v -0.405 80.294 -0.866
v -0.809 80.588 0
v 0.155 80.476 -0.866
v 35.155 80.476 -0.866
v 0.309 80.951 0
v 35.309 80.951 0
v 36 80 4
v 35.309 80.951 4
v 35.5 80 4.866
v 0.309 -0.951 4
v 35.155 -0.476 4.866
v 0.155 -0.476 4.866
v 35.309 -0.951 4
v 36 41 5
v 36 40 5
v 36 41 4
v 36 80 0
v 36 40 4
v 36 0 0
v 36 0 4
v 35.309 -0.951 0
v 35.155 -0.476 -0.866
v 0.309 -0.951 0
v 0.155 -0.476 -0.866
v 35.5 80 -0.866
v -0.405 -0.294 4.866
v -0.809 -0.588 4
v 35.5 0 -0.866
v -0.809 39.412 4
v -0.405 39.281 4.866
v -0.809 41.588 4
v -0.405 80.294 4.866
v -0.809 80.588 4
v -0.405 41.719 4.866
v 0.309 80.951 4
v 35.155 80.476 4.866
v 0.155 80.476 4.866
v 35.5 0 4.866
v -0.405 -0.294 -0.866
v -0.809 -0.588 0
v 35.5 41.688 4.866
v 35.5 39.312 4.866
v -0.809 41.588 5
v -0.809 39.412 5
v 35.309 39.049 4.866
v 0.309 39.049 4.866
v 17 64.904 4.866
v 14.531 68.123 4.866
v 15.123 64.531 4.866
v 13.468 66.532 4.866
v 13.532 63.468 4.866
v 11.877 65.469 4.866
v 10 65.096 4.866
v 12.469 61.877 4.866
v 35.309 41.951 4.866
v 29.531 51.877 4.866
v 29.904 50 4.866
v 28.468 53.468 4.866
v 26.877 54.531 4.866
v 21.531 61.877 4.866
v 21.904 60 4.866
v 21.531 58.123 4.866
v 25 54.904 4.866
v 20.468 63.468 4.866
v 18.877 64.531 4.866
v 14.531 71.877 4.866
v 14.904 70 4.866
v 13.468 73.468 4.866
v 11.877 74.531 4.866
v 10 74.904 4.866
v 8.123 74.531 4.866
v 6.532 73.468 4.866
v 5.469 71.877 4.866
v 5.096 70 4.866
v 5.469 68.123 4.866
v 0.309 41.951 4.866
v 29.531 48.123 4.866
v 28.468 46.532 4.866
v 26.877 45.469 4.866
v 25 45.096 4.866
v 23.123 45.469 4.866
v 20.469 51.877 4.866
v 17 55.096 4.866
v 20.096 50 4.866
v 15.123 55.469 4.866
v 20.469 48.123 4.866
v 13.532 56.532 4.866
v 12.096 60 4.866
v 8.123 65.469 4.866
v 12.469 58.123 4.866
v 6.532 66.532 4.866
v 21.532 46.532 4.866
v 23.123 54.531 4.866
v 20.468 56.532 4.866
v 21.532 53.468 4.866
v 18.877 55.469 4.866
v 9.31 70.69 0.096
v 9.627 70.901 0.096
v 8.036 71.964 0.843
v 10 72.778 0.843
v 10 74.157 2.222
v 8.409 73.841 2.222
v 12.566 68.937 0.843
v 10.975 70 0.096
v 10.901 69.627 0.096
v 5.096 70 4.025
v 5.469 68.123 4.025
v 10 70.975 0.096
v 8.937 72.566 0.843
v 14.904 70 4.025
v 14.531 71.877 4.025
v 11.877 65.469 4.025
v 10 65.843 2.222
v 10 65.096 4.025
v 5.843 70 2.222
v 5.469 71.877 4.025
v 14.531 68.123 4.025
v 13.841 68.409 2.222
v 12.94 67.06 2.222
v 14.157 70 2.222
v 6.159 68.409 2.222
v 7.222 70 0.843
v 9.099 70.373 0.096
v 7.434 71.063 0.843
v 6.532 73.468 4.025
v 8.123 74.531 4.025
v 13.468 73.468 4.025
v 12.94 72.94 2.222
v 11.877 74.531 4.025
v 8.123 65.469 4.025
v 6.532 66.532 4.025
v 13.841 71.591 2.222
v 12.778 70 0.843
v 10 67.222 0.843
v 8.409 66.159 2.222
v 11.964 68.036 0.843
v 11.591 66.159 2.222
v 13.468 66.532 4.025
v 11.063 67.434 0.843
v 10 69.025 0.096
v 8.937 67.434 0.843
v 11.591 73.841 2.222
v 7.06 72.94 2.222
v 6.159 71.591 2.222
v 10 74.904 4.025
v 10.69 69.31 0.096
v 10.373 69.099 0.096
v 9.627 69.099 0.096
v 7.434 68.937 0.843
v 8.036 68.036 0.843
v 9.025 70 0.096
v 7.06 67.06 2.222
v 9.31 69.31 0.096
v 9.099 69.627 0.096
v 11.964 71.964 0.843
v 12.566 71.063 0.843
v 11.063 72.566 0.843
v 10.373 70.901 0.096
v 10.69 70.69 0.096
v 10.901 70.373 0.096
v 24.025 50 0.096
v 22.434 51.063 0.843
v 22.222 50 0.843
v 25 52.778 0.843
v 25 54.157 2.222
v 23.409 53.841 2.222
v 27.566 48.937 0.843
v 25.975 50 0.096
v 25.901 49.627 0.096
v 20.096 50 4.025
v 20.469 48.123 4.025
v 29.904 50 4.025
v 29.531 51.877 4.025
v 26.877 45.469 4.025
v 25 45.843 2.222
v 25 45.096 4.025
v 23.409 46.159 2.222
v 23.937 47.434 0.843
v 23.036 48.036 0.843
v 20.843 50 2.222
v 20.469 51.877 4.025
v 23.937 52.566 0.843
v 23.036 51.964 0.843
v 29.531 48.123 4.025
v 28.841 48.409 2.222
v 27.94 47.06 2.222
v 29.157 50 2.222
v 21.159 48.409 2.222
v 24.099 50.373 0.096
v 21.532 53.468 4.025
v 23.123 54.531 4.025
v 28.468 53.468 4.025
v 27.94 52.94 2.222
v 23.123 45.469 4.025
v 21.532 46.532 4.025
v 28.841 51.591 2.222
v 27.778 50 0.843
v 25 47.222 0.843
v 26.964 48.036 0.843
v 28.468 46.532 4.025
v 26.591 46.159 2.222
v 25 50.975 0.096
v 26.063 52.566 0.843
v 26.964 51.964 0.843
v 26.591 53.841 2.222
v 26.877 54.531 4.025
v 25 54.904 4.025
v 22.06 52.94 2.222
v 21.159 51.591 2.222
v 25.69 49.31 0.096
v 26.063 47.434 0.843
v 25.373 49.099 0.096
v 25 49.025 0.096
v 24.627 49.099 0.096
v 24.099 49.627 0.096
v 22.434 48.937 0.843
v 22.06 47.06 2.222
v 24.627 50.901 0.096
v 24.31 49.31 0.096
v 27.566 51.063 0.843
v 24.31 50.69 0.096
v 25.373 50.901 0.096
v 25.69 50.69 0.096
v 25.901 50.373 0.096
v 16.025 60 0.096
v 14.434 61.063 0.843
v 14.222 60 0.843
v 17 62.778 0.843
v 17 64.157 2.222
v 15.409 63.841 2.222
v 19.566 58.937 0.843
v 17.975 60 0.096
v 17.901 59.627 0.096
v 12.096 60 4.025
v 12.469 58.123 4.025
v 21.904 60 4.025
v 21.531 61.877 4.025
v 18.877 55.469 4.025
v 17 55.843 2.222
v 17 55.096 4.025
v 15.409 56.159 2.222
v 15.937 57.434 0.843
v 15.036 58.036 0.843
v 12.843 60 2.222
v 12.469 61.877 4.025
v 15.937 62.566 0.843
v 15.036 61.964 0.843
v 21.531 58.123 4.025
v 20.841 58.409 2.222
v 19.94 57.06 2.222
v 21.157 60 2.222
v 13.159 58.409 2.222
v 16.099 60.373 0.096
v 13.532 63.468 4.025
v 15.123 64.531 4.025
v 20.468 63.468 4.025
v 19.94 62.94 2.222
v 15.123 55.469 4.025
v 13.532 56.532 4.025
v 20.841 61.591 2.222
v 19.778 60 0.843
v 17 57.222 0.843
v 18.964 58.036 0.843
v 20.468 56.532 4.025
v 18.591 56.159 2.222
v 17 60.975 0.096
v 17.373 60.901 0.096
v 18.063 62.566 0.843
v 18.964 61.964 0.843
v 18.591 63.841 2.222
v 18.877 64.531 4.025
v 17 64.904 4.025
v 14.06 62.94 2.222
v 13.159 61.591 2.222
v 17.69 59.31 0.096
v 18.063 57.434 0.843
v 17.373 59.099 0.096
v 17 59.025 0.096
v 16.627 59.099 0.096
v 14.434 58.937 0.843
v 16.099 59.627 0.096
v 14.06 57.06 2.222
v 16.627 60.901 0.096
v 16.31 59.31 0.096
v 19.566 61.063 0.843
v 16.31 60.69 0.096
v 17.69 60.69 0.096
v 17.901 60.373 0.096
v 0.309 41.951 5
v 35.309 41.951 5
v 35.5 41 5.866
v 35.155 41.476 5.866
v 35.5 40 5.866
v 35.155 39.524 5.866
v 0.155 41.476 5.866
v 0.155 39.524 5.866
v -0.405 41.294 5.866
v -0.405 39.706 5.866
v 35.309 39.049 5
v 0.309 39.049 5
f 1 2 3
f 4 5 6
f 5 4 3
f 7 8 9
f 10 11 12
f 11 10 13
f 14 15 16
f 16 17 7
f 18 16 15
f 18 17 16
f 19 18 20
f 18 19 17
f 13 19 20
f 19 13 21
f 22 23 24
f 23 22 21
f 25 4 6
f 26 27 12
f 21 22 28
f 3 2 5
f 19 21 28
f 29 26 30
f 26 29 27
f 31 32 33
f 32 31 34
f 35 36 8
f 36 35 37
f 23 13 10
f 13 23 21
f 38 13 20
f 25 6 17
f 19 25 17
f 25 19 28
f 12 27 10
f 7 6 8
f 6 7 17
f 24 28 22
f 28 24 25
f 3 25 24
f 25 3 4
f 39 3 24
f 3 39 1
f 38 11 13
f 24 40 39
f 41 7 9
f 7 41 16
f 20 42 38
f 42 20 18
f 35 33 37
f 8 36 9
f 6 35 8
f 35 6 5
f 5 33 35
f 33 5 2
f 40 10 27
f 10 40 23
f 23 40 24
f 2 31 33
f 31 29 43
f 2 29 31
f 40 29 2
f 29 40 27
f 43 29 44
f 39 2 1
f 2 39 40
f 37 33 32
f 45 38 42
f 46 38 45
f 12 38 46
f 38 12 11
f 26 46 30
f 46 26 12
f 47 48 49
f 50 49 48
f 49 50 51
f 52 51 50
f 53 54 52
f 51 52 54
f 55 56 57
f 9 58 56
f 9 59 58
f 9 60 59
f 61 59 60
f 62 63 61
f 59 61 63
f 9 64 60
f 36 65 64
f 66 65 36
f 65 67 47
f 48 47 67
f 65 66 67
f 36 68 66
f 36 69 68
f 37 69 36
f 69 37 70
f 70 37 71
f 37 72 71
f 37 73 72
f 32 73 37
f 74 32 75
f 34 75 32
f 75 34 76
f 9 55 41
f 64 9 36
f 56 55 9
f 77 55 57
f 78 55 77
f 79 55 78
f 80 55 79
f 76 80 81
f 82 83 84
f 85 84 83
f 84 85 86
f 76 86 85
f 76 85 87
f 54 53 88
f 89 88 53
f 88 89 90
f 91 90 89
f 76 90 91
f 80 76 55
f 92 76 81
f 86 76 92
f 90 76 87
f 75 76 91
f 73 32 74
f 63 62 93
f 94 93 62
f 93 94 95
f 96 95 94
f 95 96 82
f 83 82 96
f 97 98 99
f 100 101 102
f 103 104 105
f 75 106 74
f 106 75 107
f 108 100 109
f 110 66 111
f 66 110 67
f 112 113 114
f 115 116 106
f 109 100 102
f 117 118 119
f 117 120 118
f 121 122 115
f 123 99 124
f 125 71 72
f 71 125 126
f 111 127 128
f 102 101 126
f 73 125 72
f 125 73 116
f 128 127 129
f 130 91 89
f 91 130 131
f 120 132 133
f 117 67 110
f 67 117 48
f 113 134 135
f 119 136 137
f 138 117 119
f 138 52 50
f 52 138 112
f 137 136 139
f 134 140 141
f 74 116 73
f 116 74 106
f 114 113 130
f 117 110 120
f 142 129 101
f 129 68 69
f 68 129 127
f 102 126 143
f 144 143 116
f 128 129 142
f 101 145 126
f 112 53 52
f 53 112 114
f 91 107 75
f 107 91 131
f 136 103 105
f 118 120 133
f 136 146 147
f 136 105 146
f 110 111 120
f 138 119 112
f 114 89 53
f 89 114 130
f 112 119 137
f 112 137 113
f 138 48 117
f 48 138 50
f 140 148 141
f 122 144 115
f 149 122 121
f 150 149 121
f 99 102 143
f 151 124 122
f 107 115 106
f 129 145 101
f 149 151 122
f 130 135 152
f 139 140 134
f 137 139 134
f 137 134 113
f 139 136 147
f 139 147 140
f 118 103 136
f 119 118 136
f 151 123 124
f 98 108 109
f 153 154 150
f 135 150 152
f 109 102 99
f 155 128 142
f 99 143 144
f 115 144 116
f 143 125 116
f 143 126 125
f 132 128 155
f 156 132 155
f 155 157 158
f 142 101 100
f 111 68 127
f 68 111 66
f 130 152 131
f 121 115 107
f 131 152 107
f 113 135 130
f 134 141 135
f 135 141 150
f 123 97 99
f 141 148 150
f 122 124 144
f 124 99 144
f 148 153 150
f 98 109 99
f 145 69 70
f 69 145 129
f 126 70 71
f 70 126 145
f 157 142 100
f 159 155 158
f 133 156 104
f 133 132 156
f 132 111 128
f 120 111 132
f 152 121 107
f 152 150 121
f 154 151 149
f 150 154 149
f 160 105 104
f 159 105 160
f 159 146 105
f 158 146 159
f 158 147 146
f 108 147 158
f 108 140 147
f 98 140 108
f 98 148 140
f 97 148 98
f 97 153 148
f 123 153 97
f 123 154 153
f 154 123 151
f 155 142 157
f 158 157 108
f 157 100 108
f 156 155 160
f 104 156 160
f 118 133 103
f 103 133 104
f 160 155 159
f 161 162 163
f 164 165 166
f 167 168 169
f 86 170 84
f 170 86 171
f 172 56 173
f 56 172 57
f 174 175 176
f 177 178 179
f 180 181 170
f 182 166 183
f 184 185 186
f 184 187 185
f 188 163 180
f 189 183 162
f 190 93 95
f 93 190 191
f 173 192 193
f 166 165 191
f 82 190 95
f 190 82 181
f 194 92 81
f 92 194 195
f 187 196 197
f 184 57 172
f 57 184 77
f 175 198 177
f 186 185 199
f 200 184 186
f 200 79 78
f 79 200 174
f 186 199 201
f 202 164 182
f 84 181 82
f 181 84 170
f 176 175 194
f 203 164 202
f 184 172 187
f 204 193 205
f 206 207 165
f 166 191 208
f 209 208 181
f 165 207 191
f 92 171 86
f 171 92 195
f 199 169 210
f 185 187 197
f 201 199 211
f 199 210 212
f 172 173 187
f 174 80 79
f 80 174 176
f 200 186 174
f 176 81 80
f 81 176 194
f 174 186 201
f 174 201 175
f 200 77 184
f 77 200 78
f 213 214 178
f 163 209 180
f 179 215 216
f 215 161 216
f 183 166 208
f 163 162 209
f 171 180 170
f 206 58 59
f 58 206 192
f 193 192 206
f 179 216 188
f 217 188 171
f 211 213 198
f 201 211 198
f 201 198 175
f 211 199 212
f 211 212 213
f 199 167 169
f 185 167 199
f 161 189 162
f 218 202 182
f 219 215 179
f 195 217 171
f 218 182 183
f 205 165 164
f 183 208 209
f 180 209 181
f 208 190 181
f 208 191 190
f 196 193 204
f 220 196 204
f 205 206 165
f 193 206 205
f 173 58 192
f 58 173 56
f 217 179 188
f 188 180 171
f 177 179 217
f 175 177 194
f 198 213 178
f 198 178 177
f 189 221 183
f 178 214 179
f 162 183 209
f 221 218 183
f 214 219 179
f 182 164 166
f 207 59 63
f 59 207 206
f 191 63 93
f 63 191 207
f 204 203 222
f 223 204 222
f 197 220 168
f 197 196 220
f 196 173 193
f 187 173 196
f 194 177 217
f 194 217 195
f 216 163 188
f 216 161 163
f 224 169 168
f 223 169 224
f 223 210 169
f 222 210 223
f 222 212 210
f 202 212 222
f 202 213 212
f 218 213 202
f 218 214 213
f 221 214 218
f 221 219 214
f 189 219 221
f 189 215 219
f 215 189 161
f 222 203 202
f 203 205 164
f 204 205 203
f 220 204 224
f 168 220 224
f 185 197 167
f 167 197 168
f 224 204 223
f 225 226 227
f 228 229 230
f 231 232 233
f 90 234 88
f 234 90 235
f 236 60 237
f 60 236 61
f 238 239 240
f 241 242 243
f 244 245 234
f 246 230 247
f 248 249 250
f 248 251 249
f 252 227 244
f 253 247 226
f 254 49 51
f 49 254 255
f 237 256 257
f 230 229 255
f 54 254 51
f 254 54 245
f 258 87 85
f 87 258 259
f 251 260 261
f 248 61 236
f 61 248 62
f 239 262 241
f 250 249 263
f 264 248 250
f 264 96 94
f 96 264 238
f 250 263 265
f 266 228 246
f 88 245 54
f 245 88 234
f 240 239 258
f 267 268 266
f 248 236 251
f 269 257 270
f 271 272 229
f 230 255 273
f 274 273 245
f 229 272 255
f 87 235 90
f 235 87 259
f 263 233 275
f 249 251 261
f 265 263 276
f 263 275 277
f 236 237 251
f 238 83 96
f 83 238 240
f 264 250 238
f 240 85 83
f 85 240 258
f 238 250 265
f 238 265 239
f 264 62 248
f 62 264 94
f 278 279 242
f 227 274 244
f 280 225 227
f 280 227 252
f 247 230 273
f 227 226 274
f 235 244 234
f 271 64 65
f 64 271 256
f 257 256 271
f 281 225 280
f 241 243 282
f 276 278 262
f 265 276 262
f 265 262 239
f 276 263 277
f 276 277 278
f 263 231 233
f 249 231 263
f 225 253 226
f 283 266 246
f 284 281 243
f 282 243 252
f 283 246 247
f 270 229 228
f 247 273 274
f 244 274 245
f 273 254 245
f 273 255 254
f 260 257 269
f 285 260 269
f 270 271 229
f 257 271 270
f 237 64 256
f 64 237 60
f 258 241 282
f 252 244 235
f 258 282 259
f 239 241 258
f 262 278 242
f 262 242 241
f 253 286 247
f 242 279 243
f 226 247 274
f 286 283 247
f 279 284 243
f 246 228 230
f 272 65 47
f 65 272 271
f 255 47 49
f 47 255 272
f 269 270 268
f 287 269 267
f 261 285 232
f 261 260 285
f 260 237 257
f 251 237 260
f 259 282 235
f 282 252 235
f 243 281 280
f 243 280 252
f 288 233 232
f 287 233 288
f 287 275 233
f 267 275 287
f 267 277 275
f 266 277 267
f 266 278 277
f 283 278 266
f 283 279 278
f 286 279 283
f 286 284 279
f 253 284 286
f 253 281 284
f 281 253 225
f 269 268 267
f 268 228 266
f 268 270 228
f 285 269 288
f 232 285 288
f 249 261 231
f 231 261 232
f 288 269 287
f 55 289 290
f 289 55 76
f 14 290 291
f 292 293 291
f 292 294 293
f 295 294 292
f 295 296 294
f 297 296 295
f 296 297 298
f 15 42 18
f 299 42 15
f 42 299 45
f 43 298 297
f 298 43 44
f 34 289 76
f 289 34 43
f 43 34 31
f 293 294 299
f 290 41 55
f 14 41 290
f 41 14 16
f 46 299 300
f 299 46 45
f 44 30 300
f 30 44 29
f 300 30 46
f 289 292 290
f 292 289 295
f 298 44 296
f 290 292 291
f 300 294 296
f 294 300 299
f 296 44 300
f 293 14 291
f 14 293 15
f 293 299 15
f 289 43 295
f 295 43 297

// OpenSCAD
// Loguncov Maxim 13.12.13


//$fn=128;


translate([0,40,0])
minkowski()
{cube([35,1,5]);
sphere(1);
}

difference() {

//основа
minkowski()
{cube([35,80,4]);
sphere(1);
}

//отверстия


translate([10,70,5])sphere(5);
translate([25,50,5])sphere(5);
translate([17,60,5])sphere(5);



}
